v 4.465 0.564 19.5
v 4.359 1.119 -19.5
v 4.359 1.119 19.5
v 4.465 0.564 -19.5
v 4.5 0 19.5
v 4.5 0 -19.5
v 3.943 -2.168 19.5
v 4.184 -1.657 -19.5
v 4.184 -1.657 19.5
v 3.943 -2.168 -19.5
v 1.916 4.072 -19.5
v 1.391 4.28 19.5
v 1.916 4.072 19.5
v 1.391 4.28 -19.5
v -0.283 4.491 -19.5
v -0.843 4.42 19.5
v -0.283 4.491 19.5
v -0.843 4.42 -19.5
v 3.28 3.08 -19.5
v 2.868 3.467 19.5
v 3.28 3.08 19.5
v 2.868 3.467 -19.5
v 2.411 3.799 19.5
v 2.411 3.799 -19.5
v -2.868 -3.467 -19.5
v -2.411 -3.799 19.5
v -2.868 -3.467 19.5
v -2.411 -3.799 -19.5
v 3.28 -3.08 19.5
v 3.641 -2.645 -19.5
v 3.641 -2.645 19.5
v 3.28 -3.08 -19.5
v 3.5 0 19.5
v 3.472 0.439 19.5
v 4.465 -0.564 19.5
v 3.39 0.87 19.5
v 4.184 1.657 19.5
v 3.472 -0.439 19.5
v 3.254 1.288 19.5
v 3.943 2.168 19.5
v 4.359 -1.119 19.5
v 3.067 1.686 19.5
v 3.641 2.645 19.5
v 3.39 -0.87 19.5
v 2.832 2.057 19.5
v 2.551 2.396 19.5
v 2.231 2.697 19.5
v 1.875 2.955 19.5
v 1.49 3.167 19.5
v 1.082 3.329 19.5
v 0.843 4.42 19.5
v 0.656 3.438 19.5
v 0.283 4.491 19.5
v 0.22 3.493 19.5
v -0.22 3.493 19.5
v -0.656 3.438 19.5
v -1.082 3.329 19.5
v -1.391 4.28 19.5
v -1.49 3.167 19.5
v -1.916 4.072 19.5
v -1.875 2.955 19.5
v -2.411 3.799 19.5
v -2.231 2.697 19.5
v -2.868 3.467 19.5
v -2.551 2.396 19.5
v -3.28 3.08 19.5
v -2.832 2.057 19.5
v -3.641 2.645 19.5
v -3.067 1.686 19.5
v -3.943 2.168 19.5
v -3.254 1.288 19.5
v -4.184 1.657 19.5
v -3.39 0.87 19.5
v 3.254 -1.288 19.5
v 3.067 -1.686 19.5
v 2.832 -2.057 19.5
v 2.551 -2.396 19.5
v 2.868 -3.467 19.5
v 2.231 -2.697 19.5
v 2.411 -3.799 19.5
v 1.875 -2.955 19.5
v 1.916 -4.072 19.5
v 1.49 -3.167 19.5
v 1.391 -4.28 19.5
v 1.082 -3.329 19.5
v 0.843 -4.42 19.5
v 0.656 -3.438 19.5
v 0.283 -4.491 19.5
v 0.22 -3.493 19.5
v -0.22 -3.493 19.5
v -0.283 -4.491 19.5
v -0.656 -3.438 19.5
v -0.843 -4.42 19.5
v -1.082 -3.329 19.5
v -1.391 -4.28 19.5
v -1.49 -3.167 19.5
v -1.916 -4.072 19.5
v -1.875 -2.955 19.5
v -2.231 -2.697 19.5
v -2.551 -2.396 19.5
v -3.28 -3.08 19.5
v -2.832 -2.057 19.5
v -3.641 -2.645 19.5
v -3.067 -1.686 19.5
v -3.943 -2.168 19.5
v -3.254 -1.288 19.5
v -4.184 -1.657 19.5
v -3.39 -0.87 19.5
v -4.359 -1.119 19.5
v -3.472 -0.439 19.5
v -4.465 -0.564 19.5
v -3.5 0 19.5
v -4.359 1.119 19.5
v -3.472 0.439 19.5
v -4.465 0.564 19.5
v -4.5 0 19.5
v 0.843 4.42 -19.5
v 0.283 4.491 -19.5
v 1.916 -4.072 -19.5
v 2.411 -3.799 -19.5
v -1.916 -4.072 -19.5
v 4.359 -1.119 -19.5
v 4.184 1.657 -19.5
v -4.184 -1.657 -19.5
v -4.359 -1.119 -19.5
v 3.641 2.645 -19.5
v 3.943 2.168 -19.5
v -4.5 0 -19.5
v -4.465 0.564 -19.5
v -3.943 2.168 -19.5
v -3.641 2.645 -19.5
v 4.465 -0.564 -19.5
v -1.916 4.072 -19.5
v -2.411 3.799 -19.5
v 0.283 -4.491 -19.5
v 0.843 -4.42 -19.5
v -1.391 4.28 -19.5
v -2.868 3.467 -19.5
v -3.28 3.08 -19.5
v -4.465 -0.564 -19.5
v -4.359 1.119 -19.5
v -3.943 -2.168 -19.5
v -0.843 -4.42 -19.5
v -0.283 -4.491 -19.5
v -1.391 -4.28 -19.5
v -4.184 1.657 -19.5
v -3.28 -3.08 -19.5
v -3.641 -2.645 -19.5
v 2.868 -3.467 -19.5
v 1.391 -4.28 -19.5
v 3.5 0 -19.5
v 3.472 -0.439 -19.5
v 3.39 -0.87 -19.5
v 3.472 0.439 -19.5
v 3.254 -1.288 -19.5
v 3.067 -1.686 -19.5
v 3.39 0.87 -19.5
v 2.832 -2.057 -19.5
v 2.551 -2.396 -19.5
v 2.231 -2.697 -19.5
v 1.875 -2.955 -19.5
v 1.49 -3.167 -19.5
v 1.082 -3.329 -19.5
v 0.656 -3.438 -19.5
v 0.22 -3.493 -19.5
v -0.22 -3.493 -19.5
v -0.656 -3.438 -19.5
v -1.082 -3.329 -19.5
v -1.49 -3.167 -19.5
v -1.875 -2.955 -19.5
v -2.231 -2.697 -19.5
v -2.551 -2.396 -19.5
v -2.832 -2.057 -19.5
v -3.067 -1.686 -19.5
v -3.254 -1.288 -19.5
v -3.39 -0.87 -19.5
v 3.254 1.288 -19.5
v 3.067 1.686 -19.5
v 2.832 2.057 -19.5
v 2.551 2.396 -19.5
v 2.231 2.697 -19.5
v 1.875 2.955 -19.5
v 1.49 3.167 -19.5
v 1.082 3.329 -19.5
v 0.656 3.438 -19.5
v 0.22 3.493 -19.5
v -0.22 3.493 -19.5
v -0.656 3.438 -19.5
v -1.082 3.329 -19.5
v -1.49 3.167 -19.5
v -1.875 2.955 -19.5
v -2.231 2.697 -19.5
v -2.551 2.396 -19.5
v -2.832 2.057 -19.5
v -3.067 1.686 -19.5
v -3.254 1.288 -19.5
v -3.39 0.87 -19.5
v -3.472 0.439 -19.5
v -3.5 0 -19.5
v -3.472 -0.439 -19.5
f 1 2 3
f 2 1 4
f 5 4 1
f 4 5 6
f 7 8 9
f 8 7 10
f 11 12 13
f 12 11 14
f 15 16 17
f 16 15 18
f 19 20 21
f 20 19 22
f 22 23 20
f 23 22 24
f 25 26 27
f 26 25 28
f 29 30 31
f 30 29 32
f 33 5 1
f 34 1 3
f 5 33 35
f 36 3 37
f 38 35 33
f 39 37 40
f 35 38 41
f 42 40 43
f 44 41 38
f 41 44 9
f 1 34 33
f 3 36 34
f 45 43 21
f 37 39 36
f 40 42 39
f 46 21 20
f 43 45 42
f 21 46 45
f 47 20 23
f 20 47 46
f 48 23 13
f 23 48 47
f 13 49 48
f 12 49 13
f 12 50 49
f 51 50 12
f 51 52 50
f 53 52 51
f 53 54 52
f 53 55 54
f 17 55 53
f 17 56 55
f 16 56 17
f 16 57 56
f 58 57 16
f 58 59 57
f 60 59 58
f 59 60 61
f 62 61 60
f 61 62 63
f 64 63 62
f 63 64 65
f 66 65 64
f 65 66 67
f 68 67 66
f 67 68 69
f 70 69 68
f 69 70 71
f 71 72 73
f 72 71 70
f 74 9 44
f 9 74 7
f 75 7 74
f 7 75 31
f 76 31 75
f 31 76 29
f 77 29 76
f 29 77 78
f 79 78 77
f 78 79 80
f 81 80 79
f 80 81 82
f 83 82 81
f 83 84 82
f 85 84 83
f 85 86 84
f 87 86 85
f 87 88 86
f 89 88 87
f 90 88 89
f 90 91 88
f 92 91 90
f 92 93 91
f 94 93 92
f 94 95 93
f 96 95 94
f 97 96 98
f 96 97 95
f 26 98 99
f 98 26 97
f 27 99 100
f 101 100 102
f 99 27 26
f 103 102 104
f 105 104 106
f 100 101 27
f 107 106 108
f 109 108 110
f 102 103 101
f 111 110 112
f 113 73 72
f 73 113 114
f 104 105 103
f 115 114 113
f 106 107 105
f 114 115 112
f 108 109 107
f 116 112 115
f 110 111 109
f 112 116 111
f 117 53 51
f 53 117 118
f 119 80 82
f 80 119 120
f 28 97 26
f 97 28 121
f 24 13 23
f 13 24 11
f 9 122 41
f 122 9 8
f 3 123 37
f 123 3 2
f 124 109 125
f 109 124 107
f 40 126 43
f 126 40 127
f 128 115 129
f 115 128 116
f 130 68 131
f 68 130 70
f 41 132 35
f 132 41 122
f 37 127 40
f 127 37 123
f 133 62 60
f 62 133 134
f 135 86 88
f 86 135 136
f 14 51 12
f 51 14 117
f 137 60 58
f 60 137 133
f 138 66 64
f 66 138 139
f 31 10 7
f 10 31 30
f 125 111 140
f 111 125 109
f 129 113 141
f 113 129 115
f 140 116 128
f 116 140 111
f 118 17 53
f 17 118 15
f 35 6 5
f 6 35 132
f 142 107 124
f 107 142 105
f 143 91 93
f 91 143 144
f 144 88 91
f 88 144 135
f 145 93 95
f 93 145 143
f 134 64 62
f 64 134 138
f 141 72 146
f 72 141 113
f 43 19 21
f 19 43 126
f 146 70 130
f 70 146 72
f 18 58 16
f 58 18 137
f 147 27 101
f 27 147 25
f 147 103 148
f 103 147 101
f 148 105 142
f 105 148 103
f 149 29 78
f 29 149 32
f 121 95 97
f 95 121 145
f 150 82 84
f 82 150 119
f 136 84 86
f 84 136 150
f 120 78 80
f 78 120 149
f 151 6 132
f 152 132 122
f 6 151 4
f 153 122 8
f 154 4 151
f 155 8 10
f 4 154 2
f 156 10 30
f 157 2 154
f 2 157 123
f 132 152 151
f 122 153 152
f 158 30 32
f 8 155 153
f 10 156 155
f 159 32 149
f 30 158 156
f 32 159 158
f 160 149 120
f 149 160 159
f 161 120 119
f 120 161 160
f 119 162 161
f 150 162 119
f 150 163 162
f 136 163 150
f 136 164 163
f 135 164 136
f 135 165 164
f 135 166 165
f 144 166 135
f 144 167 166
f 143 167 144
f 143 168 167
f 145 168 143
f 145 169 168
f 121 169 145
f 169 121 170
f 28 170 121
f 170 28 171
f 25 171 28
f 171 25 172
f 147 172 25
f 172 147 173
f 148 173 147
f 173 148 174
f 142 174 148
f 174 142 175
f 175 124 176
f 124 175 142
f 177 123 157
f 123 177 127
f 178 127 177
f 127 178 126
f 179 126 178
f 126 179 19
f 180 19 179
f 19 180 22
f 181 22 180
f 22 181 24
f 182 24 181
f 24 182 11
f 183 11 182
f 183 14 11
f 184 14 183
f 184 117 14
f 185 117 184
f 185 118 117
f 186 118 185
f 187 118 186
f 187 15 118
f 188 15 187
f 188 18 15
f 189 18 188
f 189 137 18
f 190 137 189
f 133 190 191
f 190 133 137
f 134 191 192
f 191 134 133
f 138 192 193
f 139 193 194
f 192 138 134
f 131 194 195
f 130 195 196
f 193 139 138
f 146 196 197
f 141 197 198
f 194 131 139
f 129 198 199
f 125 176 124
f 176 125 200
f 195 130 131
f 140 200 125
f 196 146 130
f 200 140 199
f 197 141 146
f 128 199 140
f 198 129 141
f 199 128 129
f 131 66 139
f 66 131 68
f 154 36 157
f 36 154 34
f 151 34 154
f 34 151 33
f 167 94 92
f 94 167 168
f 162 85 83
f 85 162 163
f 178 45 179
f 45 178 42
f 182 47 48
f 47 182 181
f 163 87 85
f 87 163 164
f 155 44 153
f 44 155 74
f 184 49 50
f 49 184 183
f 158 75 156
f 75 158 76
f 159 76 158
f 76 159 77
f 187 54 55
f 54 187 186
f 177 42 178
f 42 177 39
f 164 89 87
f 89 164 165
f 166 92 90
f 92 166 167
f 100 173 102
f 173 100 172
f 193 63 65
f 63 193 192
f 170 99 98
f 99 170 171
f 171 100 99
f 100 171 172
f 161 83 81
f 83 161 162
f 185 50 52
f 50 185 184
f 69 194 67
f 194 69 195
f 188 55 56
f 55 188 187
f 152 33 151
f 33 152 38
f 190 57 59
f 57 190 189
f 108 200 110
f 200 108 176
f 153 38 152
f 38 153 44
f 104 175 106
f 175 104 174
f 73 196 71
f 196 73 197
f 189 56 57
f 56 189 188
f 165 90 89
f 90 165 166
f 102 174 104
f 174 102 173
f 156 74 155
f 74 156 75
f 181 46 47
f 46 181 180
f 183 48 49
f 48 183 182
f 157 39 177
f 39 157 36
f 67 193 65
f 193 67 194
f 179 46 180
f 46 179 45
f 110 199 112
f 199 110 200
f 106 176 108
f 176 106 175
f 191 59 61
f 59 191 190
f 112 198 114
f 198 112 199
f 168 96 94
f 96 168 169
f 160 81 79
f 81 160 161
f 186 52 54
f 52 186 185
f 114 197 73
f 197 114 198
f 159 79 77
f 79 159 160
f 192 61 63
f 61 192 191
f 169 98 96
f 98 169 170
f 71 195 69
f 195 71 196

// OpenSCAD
$fn = 50;


difference() {
	union() {
		translate(v = [0, 0, -19.5000000000]) {
			cylinder(h = 39, r = 4.5000000000);
		}
	}
	union() {
		translate(v = [0, 0, -100.0000000000]) {
			cylinder(h = 200, r = 3.5000000000);
		}
	}
}
